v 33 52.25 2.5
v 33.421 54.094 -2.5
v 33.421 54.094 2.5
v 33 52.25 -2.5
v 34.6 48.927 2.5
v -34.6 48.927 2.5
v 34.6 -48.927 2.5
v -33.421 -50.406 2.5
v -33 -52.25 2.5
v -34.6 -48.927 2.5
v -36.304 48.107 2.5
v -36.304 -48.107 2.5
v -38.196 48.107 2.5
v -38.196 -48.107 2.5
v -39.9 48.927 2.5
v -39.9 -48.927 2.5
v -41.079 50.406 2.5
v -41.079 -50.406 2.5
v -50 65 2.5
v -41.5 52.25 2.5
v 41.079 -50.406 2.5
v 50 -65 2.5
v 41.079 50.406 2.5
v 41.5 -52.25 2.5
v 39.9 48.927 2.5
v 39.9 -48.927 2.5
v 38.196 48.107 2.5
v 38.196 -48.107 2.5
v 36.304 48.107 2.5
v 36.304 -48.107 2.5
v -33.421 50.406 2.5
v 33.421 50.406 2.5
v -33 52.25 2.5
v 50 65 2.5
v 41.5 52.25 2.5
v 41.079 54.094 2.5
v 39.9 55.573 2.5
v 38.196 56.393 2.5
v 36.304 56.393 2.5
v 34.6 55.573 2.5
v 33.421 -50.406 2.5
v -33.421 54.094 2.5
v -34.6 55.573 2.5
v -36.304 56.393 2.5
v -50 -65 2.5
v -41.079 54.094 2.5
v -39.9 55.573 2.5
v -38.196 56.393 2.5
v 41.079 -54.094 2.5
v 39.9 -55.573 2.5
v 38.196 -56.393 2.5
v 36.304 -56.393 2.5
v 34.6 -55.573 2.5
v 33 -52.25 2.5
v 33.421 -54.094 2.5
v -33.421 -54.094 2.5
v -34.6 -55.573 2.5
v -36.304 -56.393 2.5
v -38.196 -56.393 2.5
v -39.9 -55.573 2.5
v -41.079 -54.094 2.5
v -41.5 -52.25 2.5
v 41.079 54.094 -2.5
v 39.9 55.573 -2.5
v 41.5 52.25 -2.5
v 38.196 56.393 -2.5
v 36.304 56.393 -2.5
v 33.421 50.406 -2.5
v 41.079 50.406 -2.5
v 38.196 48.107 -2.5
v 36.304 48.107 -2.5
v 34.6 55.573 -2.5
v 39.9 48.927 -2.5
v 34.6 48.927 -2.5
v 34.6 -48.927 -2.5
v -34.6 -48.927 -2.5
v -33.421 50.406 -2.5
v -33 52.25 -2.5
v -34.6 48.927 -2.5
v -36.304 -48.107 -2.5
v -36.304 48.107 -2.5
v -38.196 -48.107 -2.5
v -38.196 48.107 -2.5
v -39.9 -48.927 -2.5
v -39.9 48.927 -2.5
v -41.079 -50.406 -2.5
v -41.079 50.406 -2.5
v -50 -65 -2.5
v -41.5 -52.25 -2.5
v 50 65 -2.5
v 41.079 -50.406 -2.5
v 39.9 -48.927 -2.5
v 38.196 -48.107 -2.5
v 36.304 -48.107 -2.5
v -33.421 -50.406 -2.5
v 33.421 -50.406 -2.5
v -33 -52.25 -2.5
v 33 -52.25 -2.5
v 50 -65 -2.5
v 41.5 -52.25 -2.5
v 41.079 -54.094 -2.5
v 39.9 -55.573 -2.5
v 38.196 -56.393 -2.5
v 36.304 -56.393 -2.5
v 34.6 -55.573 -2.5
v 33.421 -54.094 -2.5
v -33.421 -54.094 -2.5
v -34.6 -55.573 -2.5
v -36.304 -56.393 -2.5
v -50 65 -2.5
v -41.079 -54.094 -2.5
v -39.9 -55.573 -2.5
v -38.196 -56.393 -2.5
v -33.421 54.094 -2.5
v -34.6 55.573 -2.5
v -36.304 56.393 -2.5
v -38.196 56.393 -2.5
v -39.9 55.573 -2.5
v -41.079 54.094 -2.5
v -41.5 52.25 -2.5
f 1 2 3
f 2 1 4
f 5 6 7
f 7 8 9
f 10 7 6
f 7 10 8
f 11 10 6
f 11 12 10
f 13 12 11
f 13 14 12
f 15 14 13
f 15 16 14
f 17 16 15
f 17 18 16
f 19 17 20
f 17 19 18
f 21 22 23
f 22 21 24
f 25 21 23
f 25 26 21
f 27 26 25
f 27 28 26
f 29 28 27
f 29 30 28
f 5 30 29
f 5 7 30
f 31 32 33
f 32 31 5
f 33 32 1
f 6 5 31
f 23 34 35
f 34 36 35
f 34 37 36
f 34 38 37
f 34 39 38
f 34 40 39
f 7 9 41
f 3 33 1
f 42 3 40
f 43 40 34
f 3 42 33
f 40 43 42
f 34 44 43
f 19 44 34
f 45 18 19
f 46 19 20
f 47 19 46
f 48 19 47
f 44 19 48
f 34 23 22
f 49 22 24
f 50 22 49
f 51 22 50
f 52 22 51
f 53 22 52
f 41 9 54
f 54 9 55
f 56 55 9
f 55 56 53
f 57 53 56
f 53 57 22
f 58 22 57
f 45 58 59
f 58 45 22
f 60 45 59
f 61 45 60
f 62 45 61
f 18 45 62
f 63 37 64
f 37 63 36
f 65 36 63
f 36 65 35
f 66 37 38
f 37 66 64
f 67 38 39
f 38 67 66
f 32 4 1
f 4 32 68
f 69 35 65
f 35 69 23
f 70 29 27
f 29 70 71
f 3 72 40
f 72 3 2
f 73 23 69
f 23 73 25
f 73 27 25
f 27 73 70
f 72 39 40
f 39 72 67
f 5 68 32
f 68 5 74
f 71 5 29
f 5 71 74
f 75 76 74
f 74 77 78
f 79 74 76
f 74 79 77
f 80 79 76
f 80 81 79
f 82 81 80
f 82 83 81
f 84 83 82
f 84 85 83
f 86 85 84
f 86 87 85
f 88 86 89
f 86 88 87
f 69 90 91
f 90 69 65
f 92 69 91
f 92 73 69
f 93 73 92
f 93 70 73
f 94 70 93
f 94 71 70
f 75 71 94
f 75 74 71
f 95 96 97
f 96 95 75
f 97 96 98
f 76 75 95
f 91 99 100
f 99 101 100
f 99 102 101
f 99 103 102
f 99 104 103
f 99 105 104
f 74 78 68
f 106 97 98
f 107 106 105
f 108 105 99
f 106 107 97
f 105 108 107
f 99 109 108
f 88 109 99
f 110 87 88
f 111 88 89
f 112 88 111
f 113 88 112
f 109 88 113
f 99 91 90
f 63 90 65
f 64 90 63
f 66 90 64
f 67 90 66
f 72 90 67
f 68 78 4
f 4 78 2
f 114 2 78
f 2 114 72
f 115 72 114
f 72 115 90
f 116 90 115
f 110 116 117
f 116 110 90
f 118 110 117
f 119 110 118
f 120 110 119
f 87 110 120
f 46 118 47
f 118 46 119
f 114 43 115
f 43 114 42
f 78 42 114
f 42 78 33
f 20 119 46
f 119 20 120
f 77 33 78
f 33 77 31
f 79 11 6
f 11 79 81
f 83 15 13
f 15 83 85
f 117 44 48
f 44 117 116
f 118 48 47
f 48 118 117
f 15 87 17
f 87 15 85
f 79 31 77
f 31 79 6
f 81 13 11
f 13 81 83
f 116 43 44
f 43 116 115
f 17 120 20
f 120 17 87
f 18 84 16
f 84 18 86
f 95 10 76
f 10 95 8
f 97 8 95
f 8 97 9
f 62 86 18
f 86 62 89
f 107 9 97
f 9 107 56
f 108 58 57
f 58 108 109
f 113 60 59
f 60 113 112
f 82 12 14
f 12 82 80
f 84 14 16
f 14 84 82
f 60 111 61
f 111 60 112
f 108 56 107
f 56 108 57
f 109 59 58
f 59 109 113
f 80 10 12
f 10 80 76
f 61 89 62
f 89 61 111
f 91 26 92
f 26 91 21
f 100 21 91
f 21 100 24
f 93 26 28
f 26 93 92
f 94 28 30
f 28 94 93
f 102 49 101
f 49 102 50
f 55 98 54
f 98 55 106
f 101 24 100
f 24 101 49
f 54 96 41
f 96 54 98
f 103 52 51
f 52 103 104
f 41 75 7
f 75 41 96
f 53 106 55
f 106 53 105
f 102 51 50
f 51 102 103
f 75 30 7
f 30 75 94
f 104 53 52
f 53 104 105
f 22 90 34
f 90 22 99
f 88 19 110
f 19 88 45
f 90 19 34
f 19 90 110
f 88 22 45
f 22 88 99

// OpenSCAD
// Generated by SolidPython 1.1.3 on 2023-07-07 07:12:53


difference() {
	cube(center = true, size = [100, 130.0000000000, 5]);
	union() {
		translate(v = [37.2500000000, 52.2500000000]) {
			cylinder(center = true, h = 5, r = 4.2500000000);
		}
		translate(v = [-37.2500000000, 52.2500000000]) {
			cylinder(center = true, h = 5, r = 4.2500000000);
		}
		translate(v = [-37.2500000000, -52.2500000000]) {
			cylinder(center = true, h = 5, r = 4.2500000000);
		}
		translate(v = [37.2500000000, -52.2500000000]) {
			cylinder(center = true, h = 5, r = 4.2500000000);
		}
	}
}
/***********************************************
*********      SolidPython code:      **********
************************************************
 
import solid
import numbers
import pudb
from solid.utils import *
import viewscad
import subprocess
import os
import os.path as osp
import math
import sys

chamfer_extrude=solid.import_scad("./chamfer_extrude.scad")
chamfer_extrude=chamfer_extrude.chamfer_extrude
r = viewscad.Renderer(width=800, height=800)

def debug(model,f_name,path="/home/ts/code/projects/mfd/designs/debug"):
    solid.scad_render_to_file(model,osp.join(path,f_name)+".scad")
#generate position list of wells using offset from center
wells_pos_from_center_4 = lambda offset: [[-offset,offset],
                                        [offset, offset],
                                        [-offset, -offset],
                                        [offset, -offset]]
#wells_pos_from_center_2 = lambda offset: [[0,offset],
#                                        [0, -offset]]
wells_pos_from_center_2 = lambda offset: [[offset,0],
                                        [-offset,0]]

def make_well(dims,shape=None,height=None,dxf=False):
    def circle_cylinder():
        if dxf or (height is None):
            well = solid.circle(r=dims, segments=64)
        else:
            well = solid.cylinder(r=dims, h=height, segments=64, center = True)
        return well
    if dims is None:
        sys.exit("radius needs to be a number")
    if isinstance(dims, numbers.Number):
        well =circle_cylinder()
    elif len(dims)==1:
        if isinstance(dims[1], numbers.Number):
            well =circle_cylinder()
        else:
            sys.exit("radius needs to be a number")
    elif len(dims)==2:
        well = solid.square(dims,center = True)
    elif len(dims)==3:
        well = solid.cube(dims, center = True)
    return well

def wells_top_bottom(center_gap,device_dims=None,shape=None,height=None, positions = None, dxf = False):
    well_shape = make_well(device_dims,shape=shape,height=height,dxf=dxf)
    wells = []
    if positions is None:
        offset = radius+radius/2.0
        positions = wells_pos_from_center_2(offset)
    if dxf or (height is None):
        height = 0
    for position in positions:
        if dxf:
            wells.append(solid.translate([position[0],position[1]])(well_shape))
        else:
            wells.append(solid.translate([position[0],position[1],height/2.0])(well_shape))
    return  union()(*wells)

#place wells in four corners 
def four_corner(radius,height=None, positions = None, dxf = False):
    #if well pos not specified set
    #to equally spaced by half radius
    if positions is None:
        offset = radius+radius/2.0
        positions = wells_pos_from_center_4(offset)
    if dxf or (height is None):
        height = 0
    #make wells at positions with specified radius and height
    wells = []
    for position in positions:
        #make circle if making dxf
        if dxf:
            well_shape = solid.circle(r=radius, segments=64)
            well_shape = solid.translate([position[0],position[1]])(well_shape)
        #if stl make cylinder
        else:
            well_shape = solid.cylinder(r=radius, h=height, segments=64, center = True)
            well_shape = solid.translate([position[0],position[1],height/2.0])(well_shape)
        wells.append(well_shape)
    return  union()(*wells)

#generate channels 
def make_channels(length,width,height=0,num_chans=1,max_chans=None,spacing=None, dxf = False,
                  rotate_channels=False):
    if dxf or (height is None):
        height = 0
    #if channel gap not defined, is equal to
    if spacing is None: spacing = width
    #calculate number of channels if fitting max num within given width
    if not max_chans is None:
        import math
        num_chans = math.floor((max_chans-spacing)/(width+spacing))
    #get total width of channel section  
    total_width = (width*num_chans)+(spacing*(num_chans-1))

    #make template channel
    #if rotate_channels: width, length = length, width
    if dxf:
        channel_t = solid.square([length,width],center = True)
    else:
        channel_t = solid.cube([length,width,height], center = True)

    #if number channels is even, offset the first channel to center its gap
    if num_chans % 2 == 0: centering = -(width/2.0+spacing/2.0)
    else: centering = 0
    #move template channel up to align bottom at z = 0 
    #and offset center if necessary
    if dxf:
        channel_t = solid.translate([0,centering])(channel_t)
    else:
        channel_t = solid.translate([0,centering,height/2.0])(channel_t)

    #if rotate_channels: length,width = width,length
    #start making the channels
    channels = []
    for i in range(num_chans):
        #if i=0 there is no translation
        #if i=1, we make the first channel adjacent to second
        direction = i

        #if i>=1, we add channels alternating left and right
        if i >= 1:
            direction = -(i/2.0)
            if i % 2 == 1: direction = (-direction)+0.5
                
        #make channel at right position and add it to channel list
        translation_coords = [0,direction*(width+spacing)]
        #if rotate_channels: translation_coords = [direction*(width+spacing),0]
        if dxf:
            channel = solid.translate(translation_coords)(channel_t)
        else:
            channel = solid.translate([*translation_coords,0])(channel_t)
        channels.append(channel)
    
    #group all channels as one object
    channels = union()(*channels)
    #compute the x,y,z dimensions in order to pass as arguments 
    #for construction of other parts of device (such as the chambers)
    measurements = {'x':(length/2.0,-length/2.0),
                    'y':(total_width/2.0,-total_width/2.0)}
    if not dxf:
        measurements['z'] = (height,0)
    if rotate_channels:
        channels = solid.rotate(90)(channels)
        measurements['x'],measurements['y']=measurements['y'],measurements['x']
    return channels,measurements

def make_chambers(msrs,height=None,extra=0,len_until=None,width=None, dxf = False):
    #computes x,y,z length
    total = lambda x : abs(x[0]) + abs(x[1])
    
    #if specific height if specified
    #otherwise use same height as channels
    if dxf:
        pass
    elif not height is None:
        msrs['z'] = (height,0)
    else:
        msrs['z'] = (0,0)
        
    #make copy of measurements from channels to modify chamber dimensions 
    #and add length to chambers as specified
    chamber_dims = msrs.copy()
    #calculate length of chamber to reach specified offset
    if not len_until is None:
        chamber_len = len_until-(msrs['x'][0])
    #or add specified length to channel length (if not specified, adds 0)
    else:
        chamber_len = msrs['x'][0]+extra
    #set the chamber length based 
    chamber_dims['x'] = (chamber_len/2.0,-(chamber_len/2.0))
    #compute final dimensions of chamber
    if not width is None:
        chamber_dims['y'] = (width/2.0,-width/2.0)
    chamber_dims = [total(size) for size in chamber_dims.values()]
        
    #calculate chamber translation offset to place adjacent to channels
    chamber_trslt = msrs['x'][0]+(chamber_len/2.0)
    #compute chamber translation coordinates to align with channels
    #x = 1 moves chamber above channels
    #x = -1 moves chamber below channels
    if dxf:
        trslt = lambda x : [x*(chamber_trslt),0]
    else:
        trslt = lambda x : [x*(chamber_trslt),0,msrs['z'][0]/2.0]
    
    #function to make chamber at top or at bottom 
    if dxf:
        move = lambda x : solid.translate(trslt(x))(solid.square(chamber_dims, center = True) )
    else:
        move = lambda x : solid.translate(trslt(x))(solid.cube(chamber_dims,center = True))
    #make top and bottom chambers and return them as grouped
    top = move(1)
    bottom = move(-1)
    #chambers=solid.rotate(90)(solid.union()(top,bottom))
    chambers=(solid.union()(top,bottom))

    return chambers

#create alignment features 
def alignment_features(unit,dims,grid_size, mask_size = None, alignment = "hollow", units_from_center = (2.5,2.5), corner_len=None):
    width = grid_size[0]*dims[0]
    length = grid_size[1]*dims[1]
    if mask_size is None and corner_len is None:
        corner_len = (dims[0] + dims[1]) /2 / 8
    corner = lambda thickness_div : solid.union()( solid.square([corner_len,corner_len/thickness_div],center=False), solid.square([corner_len/thickness_div,corner_len],center=False) )
    
    def make_full(thickness_div):
        thickness = corner_len/thickness_div
        tr = solid.translate([0, 0, 0 ])(solid.rotate(180)(corner(thickness_div)))
        tr = solid.translate([thickness/2,thickness/2,0])(tr)
        bl = solid.translate([0, 0, 0 ])(solid.rotate(0)(corner(thickness_div)))
        bl = solid.translate([-thickness/2,-thickness/2,0])(bl)
        return solid.union()(tr,bl)
    
    def make_hollow(thickness_div):
        thickness = corner_len/(thickness_div/2)
        inner = make_full(thickness_div)
        outer = make_full(thickness_div/2)
        hollow = outer - inner 
        return hollow
    
    center = (width /2 , length/2)
    mask_pos = lambda x,y : (center[0] + x*(float(units_from_center[0])*dims[0]), center[1] + y*(float(units_from_center[1])*dims[1]))
    positions = []
    positions.append(mask_pos(1,0))
    positions.append(mask_pos(0,1))
    positions.append(mask_pos(-1,0))
    positions.append(mask_pos(0,-1))
    make_mask = lambda mtype : make_hollow(8) if mtype == "hollow" else make_full(8)
    masks = [ solid.translate([*position,0])(make_mask(alignment)) for position in positions]
    
    solid.scad_render_to_file(solid.union()(*masks),"./designs/open_chamber/masks.scad")
    #return unit - solid.union()(*masks)
    return solid.union()(*masks,unit)

def create_outline(thickness, array, dims, grid_size,):
    width = grid_size[0]*dims[0] + thickness *2
    length = grid_size[1]*dims[1] + thickness *2
    outer = solid.translate([-thickness, -thickness,0])(solid.square([width, length]))
    return outer-array

def create_wall(wall_thickness, outline_thickness, dims, grid_size, wall_height = 2000, dxf = False):
    inner_width = grid_size[0]*dims[0] + outline_thickness *2
    inner_length = grid_size[1]*dims[1] + outline_thickness *2
    outer_width = inner_width + wall_thickness * 2
    outer_length = inner_length + wall_thickness * 2
    outer_pos_x = -outline_thickness-wall_thickness
    outer_pos_y = -outline_thickness-wall_thickness
    inner_pos_x = -outline_thickness
    inner_pos_y = -outline_thickness
    if dxf:
        inner_wall = solid.translate([inner_pos_x,
                                      inner_pos_y,
                                      0])(solid.square([inner_width, inner_length]))
        outer_wall = solid.translate([outer_pos_x,
                                      outer_pos_y,
                                      0])(solid.square([outer_width, outer_length]))

        return outer_wall-inner_wall
    else:
        inner_wall = solid.translate([inner_pos_x,
                                      inner_pos_y,
                                      0])(solid.cube([inner_width, inner_length,wall_height]))
        outer_wall = solid.translate([outer_pos_x,
                                      outer_pos_y,
                                      0])(solid.cube([outer_width, outer_length,wall_height]))

        return outer_wall-inner_wall, {'wall_height': wall_height,
                                       'wall_thickness': wall_thickness,
                                       'inner_width':inner_width,
                                       'inner_length': inner_length,
                                       'outer_width': outer_width,
                                       'outer_length': outer_length,
                                       'outer_pos_x' : outer_pos_x,
                                       'outer_pos_y' : outer_pos_y,
                                       'inner_pos_x' : inner_pos_x,
                                       'inner_pos_y' : inner_pos_y}

def create_thicker_wall(wall_thickness, outer_wall_offset, wall_dims, dims, grid_size, height_start = .2, height_end=2, dxf = False):
    addon_wall,thicker_wall_dims = create_wall(wall_thickness, outer_wall_offset, dims, grid_size, wall_height=height_end-height_start, dxf = False)
    addon_wall = solid.translate([0,0,height_start])(addon_wall)

    thicker_wall_dims['wall_height'] = height_end
    thicker_wall_dims['wall_thickness'] = wall_dims['wall_thickness'] + wall_thickness
    return addon_wall, thicker_wall_dims
 
def add_lock_to_wall(wall,wall_dims,y_offset = 0,cut_ratio=0.7,L_length=3, gap_ratio=0.05, axis="x",width_ratio=1/2):
    # Makes L shape
    def make_L(max_length,length_thickness,max_width,width_thickness,height,y_offset):
        length = solid.cube([max_length,length_thickness,height])
        width = solid.cube([width_thickness,max_width,height])
        width = solid.translate([max_length-(width_thickness),0,0])(width)
        L = solid.union()(width,length)
        debug(L,"L")
        if axis == "x":
            L = solid.rotate(-90)(L)
            L = solid.translate([0,max_length,0])(L)
        else:
            L = solid.rotate(-180)(L)
            L = solid.translate([max_length,max_width,0])(L)
        return solid.translate([0,0,y_offset])(L)
    
    lock_length = L_length
    lock_width = wall_dims['wall_thickness']*width_ratio
    lock_length_thickness = lock_width/2
    lock_width_thickness = lock_width/2
    L_lock = make_L(lock_length,lock_length_thickness,lock_width,lock_width_thickness, wall_dims['wall_height']-y_offset, y_offset)
    
    margin_space = lock_length - lock_length*(1-gap_ratio)
    key_length = lock_length-margin_space
    key_length_thickness = lock_length_thickness-(margin_space*2)
    key_width = lock_width-(margin_space*2)
    key_width_thickness = lock_width_thickness-(margin_space*2)
    L_key = make_L(key_length,key_length_thickness,key_width,key_width_thickness, wall_dims['wall_height']-y_offset, y_offset)
    L_key = solid.translate([margin_space,margin_space,0])(L_key)
    L = solid.union()(L_lock,L_key)
    debug(L,"L")
    
    #Make cube to be used as negative to split frame in a half
    #Can choose if making left or right negative, specify ratio of split
    def make_negative(right,cut_ratio):
        if axis == "x":
            if right:
                length = wall_dims['outer_length']*(1-cut_ratio)
                pos_x = wall_dims['outer_pos_x']+(wall_dims['outer_length']*cut_ratio)
            else:
                length = wall_dims['outer_length']*(cut_ratio)
                pos_x = wall_dims['outer_pos_x'] 
            negative = solid.cube([wall_dims['outer_width'],length, wall_dims['wall_height']])
            negative = solid.translate([wall_dims['outer_pos_y'],pos_x,0])(negative)
        else:
            if right:
                length = wall_dims['outer_width']*(1-cut_ratio)
                pos_x = wall_dims['outer_pos_y']+(wall_dims['outer_width']*cut_ratio)
            else:
                length = wall_dims['outer_width']*(cut_ratio)
                pos_x = wall_dims['outer_pos_y'] 
            negative = solid.cube([length,wall_dims['outer_length'], wall_dims['wall_height']])
            negative = solid.translate([pos_x,wall_dims['outer_pos_x'],0])(negative)
        return negative, pos_x, length 
                      
    #Make negatives
    negative_right, right_half_pos_x, right_half_length = make_negative(True,cut_ratio)
    negative_left, left_half_pos_x, right_half_length = make_negative(False,cut_ratio)
    #Make halves
    left_half = solid.difference()(wall,negative_right)
    right_half = solid.difference()(wall,negative_left)
    def place_L(L, L_length,L_width):
        #Place L on top wall       
        offset_to_center = (wall_dims['wall_thickness']-L_width)/2
        if axis == "x":
            y_pos_top = (wall_dims['outer_pos_y'] +
                    wall_dims['outer_width'] - 
                    L_width - offset_to_center)
            top_L = solid.translate([y_pos_top,
                                     right_half_pos_x-(L_length),
                                     0])(L)
            #Place L on bottom wall       
            y_pos_bottom = wall_dims['outer_pos_y']+offset_to_center
            bottom_L = solid.translate([y_pos_bottom,
                                        right_half_pos_x-L_length,
                                        0])(L)
        else:
            y_pos_top = (wall_dims['outer_pos_x'] +
                    wall_dims['outer_length'] -
                    (L_width+offset_to_center))
            top_L = solid.translate([right_half_pos_x-L_length,
                                     y_pos_top,
                                     0])(L)
            #Place L on bottom wall       
            y_pos_bottom = wall_dims['outer_pos_y']+offset_to_center
            bottom_L = solid.translate([right_half_pos_x-L_length,
                                        y_pos_bottom,
                                        0])(L)
        return bottom_L, top_L
    #Make complimentary L pieces through union and differences
    #Make Lock
    bottom_L_lock, top_L_lock = place_L(L_lock,L_length,lock_width)
    left_half = solid.difference()(left_half,bottom_L_lock)
    left_half = solid.difference()(left_half,top_L_lock)
    #Make Key
    bottom_L_key, top_L_key = place_L(L_key,L_length,lock_width)
    right_half = solid.union()(right_half,bottom_L_key)
    right_half = solid.union()(right_half,top_L_key)
    return left_half, right_half


#build a row x col grid of containment units
def make_unit_array(unit,dims,grid_size, dxf = False, alignment = None, mask_size = None,
                    units_from_center = None,alignment_offset=None, alignment_mark_size=1):
    units = []
    for col in range(grid_size[1]):
        for row in range(grid_size[0]):
            if dxf:
                units.append(solid.translate([row*dims[0],col*dims[1]])(unit))
            else:
                units.append(solid.translate([row*dims[0],col*dims[1],dims[2]/2.0])(unit))
    array = solid.union()(*units)
    if (not alignment is None) and dxf:
        if not alignment_offset is None:
            array = solid.translate([alignment_offset[0],alignment_offset[1]])(array)
        array = alignment_features(array,dims, grid_size, alignment = alignment, mask_size = None, units_from_center = units_from_center,corner_len=alignment_mark_size)
        if not alignment_offset is None:
            array = solid.translate([-alignment_offset[0],-alignment_offset[1]])(array)
    return array


def make_taylor(wells_pos = wells_pos_from_center_4(2.25), well_rad = 1.5 ,
                well_height = 2, chan_w = 0.01, chan_l = 1, chan_h = 0.010 ,
                chan_gap = 0.040, max_chans = None,num_chans=100, chamber_height  = 0.100,
                columns = 1, rows = 1, chamber_len_until=2.25, add_channels = True, add_wells = True, 
                add_chambers = True, save_path = "./", alignment = None, units_from_center = 2,
                mask_size = None, render_stl = False, outline_thickness = 0.050, dxf = True,
                wall_height = 15, wall_thickness = 0.95, casing_x=9, casing_y=9, casing_z=0,rotate_units=0):

    dims = [casing_x, casing_y, casing_z]
    wells = four_corner(well_rad,well_height, dxf = dxf, positions = wells_pos)
    debug(wells,"wells")
    channels, msrs = make_channels(chan_l,chan_w,chan_h,dxf=dxf, spacing = chan_gap, max_chans=max_chans,num_chans=num_chans)
    debug(channels,"channels")
    chambers = make_chambers(msrs,dxf = dxf, height=chamber_height,len_until=chamber_len_until)
    debug(chambers,"chambers")

    #add together and render
    device_parts = []
    if add_channels:
        device_parts.append(channels)
    if add_wells:
        device_parts.append(wells)
    if add_chambers:
        device_parts.append(chambers)
    device=union()(*device_parts)
    device = rotate(rotate_units)(device)

    device=solid.translate([dims[0]/2.0,dims[1]/2.0,0])(device)
    channels = rotate(rotate_units)(channels)
    channels=solid.translate([dims[0]/2,dims[1]/2,0])(channels)
    chambers_wells = union()(wells,chambers)
    chambers_wells = rotate(rotate_units)(chambers_wells)
    chambers_wells=solid.translate([dims[0]/2,dims[1]/2,0])(chambers_wells)

    file_name = str(rows)+'x'+str(columns)+'_units_'
    grid_size = [rows,columns]

    if alignment:
        alignment="full"
    device = make_unit_array(device,dims,grid_size, dxf=dxf, alignment = alignment,
                                 units_from_center = units_from_center)
    channels = make_unit_array(channels,dims,grid_size, dxf=dxf, alignment = alignment,
                                 units_from_center = units_from_center)
    if alignment=="full":
        alignment="hollow"

    chambers_wells = make_unit_array(chambers_wells,dims,grid_size, dxf=dxf, alignment = alignment,
                                 units_from_center =units_from_center)

    def save_model(model,prefix):
        model_fname = os.path.abspath(save_path+prefix+"_"+file_name+".scad")
        solid.scad_render_to_file(model,model_fname)
        return model_fname

    wells_fname = save_model(wells,"wells")
    channels_fname = save_model(channels,"channels")
    device_fname = save_model(device,"device")
    chambers_wells_fname = save_model(chambers_wells,"chambers_wells")
    return (chambers_wells,chambers_wells_fname), (channels,channels_fname), (device,device_fname)

def make_device(design='open',rows=8,columns=6,wells_pos = 4.5,well_offset=3.2, well_rad=3.2,well_height=0.1,
                chan_l=1,chan_w=0.01,chan_h=0.01,chan_gap=0.015,num_chans=101,dxf=True,save_path="./designs/open_chamber/",
                casing_x=9.0,casing_y=18.0,casing_z=0,rotate_units=90,units_from_center=(3,1),chamber_len_until=4.5,
                chamber_width=None,alignment=True, add_wells=True, add_channels=True,add_chambers=True):

    dims = [casing_x, casing_y, casing_z]
    if design == "open":
        wells_pos=wells_pos_from_center_2(wells_pos)
        wells = wells_top_bottom(well_offset*2,device_dims=well_rad,height=well_height, dxf = dxf, positions = wells_pos)
    elif design == "closed":
        wells_pos=wells_pos_from_center_4(wells_pos)
        debug(wells,"wells")
        wells = four_corner(well_offset,well_heightdevice_dims=well_rad, dxf = dxf, positions = wells_pos)
    else:
        print(design+" is not a valid design.\n Choose valid design: 'open' or 'closed'")
        exit()
    wells = rotate(rotate_units)(wells)
    wells=solid.translate([dims[0]/2,dims[1]/2,0])(wells)
    debug(wells,"wells")

    channels, msrs = make_channels(chan_l,chan_w,chan_h,dxf=dxf, spacing = chan_gap, num_chans=num_chans,rotate_channels=False)
    channels = rotate(rotate_units)(channels)
    channels=solid.translate([dims[0]/2,dims[1]/2,0])(channels)

    chambers=make_chambers(msrs,height=None,extra=0,len_until=chamber_len_until, width=chamber_width,dxf = dxf)
    chambers = rotate(rotate_units)(chambers)
    chambers=solid.translate([dims[0]/2,dims[1]/2,0])(chambers)

    device_parts = []
    if add_channels:
        device_parts.append(channels)
    if add_wells:
        device_parts.append(wells)
    if add_chambers:
        device_parts.append(chambers)
    device = union()(*device_parts)
    #device = rotate(rotate_units)(device)
    #device=solid.translate([dims[0]/2.0,dims[1]/2.0,0])(device)

    chambers_wells = []
    if add_chambers:
        chambers_wells.append(chambers)
    if add_wells:
        chambers_wells.append(wells)
    chambers_wells = union()(*chambers_wells)
    #chambers_wells = union()(wells,chambers)
    #chambers_wells = rotate(rotate_units)(chambers_wells)
    #chambers_wells=solid.translate([dims[0]/2,dims[1]/2,0])(chambers_wells)

    file_name = str(rows)+'x'+str(columns)+'_units_'

    grid_size = [rows,columns]
    if alignment:
        alignment="full"
    device = make_unit_array(device,dims,grid_size, dxf=dxf, alignment = alignment,
                                 units_from_center = units_from_center)
    channels = make_unit_array(channels,dims,grid_size, dxf=dxf, alignment = alignment,
                                 units_from_center = units_from_center)
    if alignment=="full":
        alignment="hollow"

    chambers_wells = make_unit_array(chambers_wells,dims,grid_size, dxf=dxf, alignment = alignment,
                                 units_from_center =units_from_center)

    def save_model(model,prefix):
        model_fname = os.path.abspath(save_path+prefix+"_"+file_name+".scad")
        solid.scad_render_to_file(model,model_fname)
        return model_fname

    wells_fname = save_model(wells,"wells")
    channels_fname = save_model(channels,"channels")
    device_fname = save_model(device,"device")
    chambers_wells_fname = save_model(chambers_wells,"chambers_wells")
    return (chambers_wells,chambers_wells_fname), (channels,channels_fname), (device,device_fname)


def make_open_chamber(rows=8,columns=6,wells_pos = wells_pos_from_center_2(4.5), well_rad=3.2,well_height=0.1,
                      chan_l=1,chan_w=0.01,chan_h=0.01,chan_gap=0.015,num_chans=101,dxf=True,save_path="./designs/open_chamber/",
                      casing_x=9.0,casing_y=18.0,casing_z=0,rotate_units=90,units_from_center=(3,1),chamber_len_until=4.5,
                      chamber_width=None,alignment=True, add_wells=True, add_channels=True,add_chambers=True):

    dims = [casing_x, casing_y, casing_z]
    wells = wells_top_bottom(well_rad,height=well_height, dxf = dxf, positions = wells_pos)
    channels, msrs = make_channels(chan_l,chan_w,chan_h,dxf=dxf, spacing = chan_gap, num_chans=num_chans,rotate_channels=False)
    chambers=make_chambers(msrs,height=None,extra=0,len_until=chamber_len_until, width=chamber_width,dxf = dxf)
    debug(chambers,"chambers")
    device_parts = []
    if add_channels:
        device_parts.append(channels)
    if add_wells:
        device_parts.append(wells)
    if add_chambers:
        device_parts.append(chambers)
    device = union()(*device_parts)
    device = rotate(rotate_units)(device)
    device=solid.translate([dims[0]/2.0,dims[1]/2.0,0])(device)
    channels = rotate(rotate_units)(channels)
    channels=solid.translate([dims[0]/2,dims[1]/2,0])(channels)
    chambers_wells = union()(wells,chambers)
    chambers_wells = rotate(rotate_units)(chambers_wells)
    chambers_wells=solid.translate([dims[0]/2,dims[1]/2,0])(chambers_wells)

    file_name = str(rows)+'x'+str(columns)+'_units_'

    grid_size = [rows,columns]
    if alignment:
        alignment="full"
    device = make_unit_array(device,dims,grid_size, dxf=dxf, alignment = alignment,
                                 units_from_center = units_from_center)
    channels = make_unit_array(channels,dims,grid_size, dxf=dxf, alignment = alignment,
                                 units_from_center = units_from_center)
    if alignment=="full":
        alignment="hollow"

    chambers_wells = make_unit_array(chambers_wells,dims,grid_size, dxf=dxf, alignment = alignment,
                                 units_from_center =units_from_center)

    def save_model(model,prefix):
        model_fname = os.path.abspath(save_path+prefix+"_"+file_name+".scad")
        solid.scad_render_to_file(model,model_fname)
        return model_fname

    wells_fname = save_model(wells,"wells")
    channels_fname = save_model(channels,"channels")
    device_fname = save_model(device,"device")
    chambers_wells_fname = save_model(chambers_wells,"chambers_wells")
    return (chambers_wells,chambers_wells_fname), (channels,channels_fname), (device,device_fname)

def to_dxf(scad_path):
    dxf_path = scad_path.replace(".scad",".dxf")
    subprocess.call(["openscad", "-o", dxf_path, scad_path])
    import ezdxf
    temp_dxf = ezdxf.readfile(dxf_path)
    temp_dxf.saveas(dxf_path)

#def make_walls(diameter,thickness,grid_size,dims,height=20,segments=256,make_inner=True):
#    wafer_wall_out = solid.cylinder(r=diameter/2,h=height, segments=segments)
#    wafer_wall_in = solid.cylinder(r=(diameter/2-thickness),h=height, segments=segments)
#    wafer_wall = solid.difference()(wafer_wall_out,wafer_wall_in)
#    wafer_wall = solid.translate([grid_size[1]*dims[1]/2.0,grid_size[0]*dims[0]/2.0])(wafer_wall)
#
#    vertical_wall_length = grid_size[1]*dims[1]
#    horizontal_wall_length = grid_size[0]*dims[0]
#    vertical_wall = solid.cube([vertical_wall_length,thickness,height],center = True)
#    vertical_wall = solid.translate([vertical_wall_length/2,0,height/2])(vertical_wall)
#    horizontal_wall = solid.cube([thickness,horizontal_wall_length,height],center = True)
#    horizontal_wall = solid.translate([0,vertical_wall_length/2,height/2])(horizontal_wall)
#    walls = []
#    walls.append(horizontal_wall)
#    walls.append(vertical_wall)
#    for col in range(grid_size[1]):
#        if col == grid_size[1]-1: 
#            walls.append(solid.translate([0,(col+1)*dims[1]])(vertical_wall))
#        elif col > 0 and col < grid_size[1]-1 and make_inner==True:
#            walls.append(solid.translate([0,(col+1)*dims[1]])(vertical_wall))
#    for row in range(grid_size[0]):
#        if row == grid_size[0]-1: 
#            walls.append(solid.translate([(row+1)*dims[0],0])(horizontal_wall))
#        elif row > 0 and row < grid_size[0]-1 and make_inner==True:
#            walls.append(solid.translate([(row+1)*dims[0],0])(horizontal_wall))
#    walls = union()(*walls)
#    wafer_walls = union()(walls,wafer_wall)
#    return walls,wafer_wall,wafer_walls

def make_walls(diameter,thickness,grid_size,dims,height=20,segments=256,make_inner=True,padx=0,pady=0):
    wafer_wall_out = solid.cylinder(r=diameter/2,h=height, segments=segments)
    wafer_wall_in = solid.cylinder(r=(diameter/2-thickness),h=height, segments=segments)
    wafer_wall = solid.difference()(wafer_wall_out,wafer_wall_in)
    wafer_wall = solid.translate([grid_size[1]*dims[1]/2.0,grid_size[0]*dims[0]/2.0])(wafer_wall)

    vertical_wall_length = grid_size[0]*dims[0]+padx
    horizontal_wall_length = grid_size[1]*dims[1]+pady
    vertical_wall = solid.cube([vertical_wall_length,thickness,height],center = True)
    vertical_wall = solid.translate([vertical_wall_length/2-pady/2,-padx/2,height/2])(vertical_wall)
    horizontal_wall = solid.cube([thickness,horizontal_wall_length,height],center = True)
    horizontal_wall = solid.translate([-pady/2,horizontal_wall_length/2-padx/2,height/2])(horizontal_wall)
    walls = []
    walls.append(horizontal_wall)
    walls.append(vertical_wall)
    for col in range(grid_size[1]):
        if col == grid_size[1]-1: 
            walls.append(solid.translate([0,(col+1)*dims[1]+pady])(vertical_wall))
        elif col > 0 and col < grid_size[1]-1 and make_inner==True:
            walls.append(solid.translate([0,(col+1)*dims[1]])(vertical_wall))
    for row in range(grid_size[0]):
        if row == grid_size[0]-1: 
            walls.append(solid.translate([(row+1)*dims[0]+padx,0])(horizontal_wall))
        elif row > 0 and row < grid_size[0]-1 and make_inner==True:
            walls.append(solid.translate([(row+1)*dims[0],0])(horizontal_wall))
    walls = union()(*walls)
    wafer_walls = union()(walls,wafer_wall)
    return walls,wafer_wall,wafer_walls

def save_model(model,base_path,base_name,dxf=True):
    if not os.path.exists(base_path):
        os.makedirs(base_path)
    dxf_path=osp.join(base_path,base_name+".scad")
    solid.scad_render_to_file(model,osp.join(dxf_path))
    if dxf:
        to_dxf(dxf_path)

def make_wafer(diameter,flat_len,thickness):
    wafer = solid.cylinder(r1=diameter/2,r2=diameter/2,h=thickness,segments=512,)()
    x_start_flat=(flat_len/2)
    y_start_flat = math.sqrt(((diameter/2)**2) - (x_start_flat**2) )
    height_delete_flat=diameter/2-y_start_flat
    flat_delete = solid.cube([flat_len,height_delete_flat,thickness],center=False)()
    flat_delete = solid.translate([-flat_len/2,y_start_flat,0])(flat_delete)
    wafer = solid.difference()(wafer,flat_delete)
    wafer = solid.rotate(90)(wafer)
    return wafer

def add_wafer_to_mask(wafer_size,flat_len,mask,grid_size,dims,wafer_line_thickness=0.1,outer_mask_thickness=5,alignment_offset=None):
    def make_wafer_mask(wafer_size,flat_len):
        wafer_mask = make_wafer(wafer_size,flat_len,1)
        wafer_mask = solid.projection()(wafer_mask)
        wafer_mask = solid.translate([grid_size[0]*dims[0]/2.0,grid_size[1]*dims[1]/2.0])(wafer_mask)
        if not alignment_offset is None:
            wafer_mask = solid.translate([-alignment_offset[0],-alignment_offset[1]])(wafer_mask)
        return wafer_mask

    inner_wafer_line_mask = make_wafer_mask(wafer_size-wafer_line_thickness/2,flat_len)
    outer_wafer_line_mask = make_wafer_mask(wafer_size+wafer_line_thickness/2,flat_len)
    outer_wafer_mask = make_wafer_mask(wafer_size+outer_mask_thickness,flat_len)
    outer_wafer_mask = solid.difference()(outer_wafer_mask,outer_wafer_line_mask)
    wafer_mask = solid.union()(outer_wafer_mask,inner_wafer_line_mask)

    return solid.difference()(wafer_mask,mask)

def make_posts(post_shape,post_height):
    posts = solid.linear_extrude(height=post_height)(post_shape)
    return posts

def make_wafer_empty(diameter,flat_len,thickness,margin,notch_len=20,notch_height=5,oversize=1.01):
    diameter*=oversize
    flat_len*=oversize
    wafer = make_wafer(diameter,flat_len,thickness)
    holder = solid.cylinder(r1=diameter/2+margin,r2=diameter/2+margin,h=thickness,segments=512)()
    holder = solid.difference()(holder,wafer)

    x_start_flat=(flat_len/2)
    y_start_flat = math.sqrt(((diameter/2)**2) - (x_start_flat**2) )
    height_delete_flat=diameter/2-y_start_flat
    notch = solid.cube([notch_len,notch_height,thickness],center=False)()
    notch = solid.translate([-notch_len/2,y_start_flat,0])(notch)
    notch = solid.rotate(90)(notch)
    return solid.difference()(holder,notch)

def wafer_print_calibration(diameter,thickness,height,z_offset):
    circles = []
    radii = []
    radii.append(diameter/2.0*0.8)
    radii.append(diameter/2.0*0.6)
    radii.append(diameter/2.0*0.4)
    radii.append(diameter/2.0*0.2)
    for radius in radii:
        inner = solid.cylinder(r1=radius-(thickness/2.0),r2=radius-(thickness/2.0),h=thickness,segments=512,)()
        outer = solid.cylinder(r1=radius+(thickness/2.0),r2=radius+(thickness/2.0),h=thickness,segments=512,)()
        diff = solid.difference()(outer,inner)
        circles.append(diff)
    circles = solid.union()(*circles)
    circles = solid.translate([0,0,z_offset])(circles)
    return circles

def make_rack(wells,dims,grid_size,alignment_offset,rack_x,rack_y,rack_thickness,bolt_width,add_bolts=True):

    #get X and Y dimensions of gride of pipette tips
    X_len = dims[0]*grid_size[0]
    Y_len = dims[1]*grid_size[1]
    #make rack
    rack = solid.cube([rack_x,rack_y,rack_thickness],center=True)

    if add_bolts:
    #add bolt holes
        bolt_hole=solid.cylinder(r=bolt_width/2,h=rack_thickness,center=True)()
        bolt_holes = []
        bolt_holes.append(solid.translate([rack_x/2-1.5*bolt_width,rack_y/2-1.5*bolt_width])(bolt_hole))
        bolt_holes.append(solid.translate([-rack_x/2+1.5*bolt_width,rack_y/2-1.5*bolt_width])(bolt_hole))
        bolt_holes.append(solid.translate([-rack_x/2+1.5*bolt_width,-rack_y/2+1.5*bolt_width])(bolt_hole))
        bolt_holes.append(solid.translate([rack_x/2-1.5*bolt_width,-rack_y/2+1.5*bolt_width])(bolt_hole))
        bolt_holes = solid.union()(*bolt_holes)
        rack=solid.difference()(rack,bolt_holes)
    rack_support = rack

    #center rack with pipette holes
    rack = solid.translate([0,0,rack_thickness/2])(rack)
    rack = solid.translate([X_len/2,Y_len/2])(rack)
    rack = solid.translate([-alignment_offset[0],-alignment_offset[1]])(rack)
    wells = solid.linear_extrude(height=rack_thickness)(wells)
    rack = solid.difference()(rack,wells)
    return rack, rack_support

def make_pillar(wells,dims,grid_size,alignment_offset,rack_x,rack_y,pillar_height,rack_thickness,bolt_width,add_bolts=True,taper_angle=1,bolt_position_corner=1.5):

    #get X and Y dimensions of gride of pipette tips
    X_len = dims[0]*grid_size[0]
    Y_len = dims[1]*grid_size[1]
    #make rack
    rack = solid.cube([rack_x,rack_y,rack_thickness],center=True)
    
    if add_bolts:
    #add bolt holes
        bolt_hole=solid.cylinder(r=bolt_width/2,h=rack_thickness,center=True)()
        bolt_holes = []
        bolt_holes.append(solid.translate([rack_x/2-bolt_position_corner*bolt_width,rack_y/2-bolt_position_corner*bolt_width])(bolt_hole))
        bolt_holes.append(solid.translate([-rack_x/2+bolt_position_corner*bolt_width,rack_y/2-bolt_position_corner*bolt_width])(bolt_hole))
        bolt_holes.append(solid.translate([-rack_x/2+bolt_position_corner*bolt_width,-rack_y/2+bolt_position_corner*bolt_width])(bolt_hole))
        bolt_holes.append(solid.translate([rack_x/2-bolt_position_corner*bolt_width,-rack_y/2+bolt_position_corner*bolt_width])(bolt_hole))
        bolt_holes = solid.union()(*bolt_holes)
        rack=solid.difference()(rack,bolt_holes)
    rack_support = rack

    #center rack with pipette holes
    #rack = solid.translate([0,0,-rack_thickness])(rack)
    rack = solid.translate([X_len/2,Y_len/2])(rack)
    rack = solid.translate([-alignment_offset[0],-alignment_offset[1]])(rack)
    if not taper_angle == 0:
        wells=chamfer_extrude(pillar_height,taper_angle,segments=20)(wells)
    else:
        wells = solid.linear_extrude(height=pillar_height)(wells)
    rack = solid.union()(rack,wells)
    return rack, rack_support









 
 
************************************************/
